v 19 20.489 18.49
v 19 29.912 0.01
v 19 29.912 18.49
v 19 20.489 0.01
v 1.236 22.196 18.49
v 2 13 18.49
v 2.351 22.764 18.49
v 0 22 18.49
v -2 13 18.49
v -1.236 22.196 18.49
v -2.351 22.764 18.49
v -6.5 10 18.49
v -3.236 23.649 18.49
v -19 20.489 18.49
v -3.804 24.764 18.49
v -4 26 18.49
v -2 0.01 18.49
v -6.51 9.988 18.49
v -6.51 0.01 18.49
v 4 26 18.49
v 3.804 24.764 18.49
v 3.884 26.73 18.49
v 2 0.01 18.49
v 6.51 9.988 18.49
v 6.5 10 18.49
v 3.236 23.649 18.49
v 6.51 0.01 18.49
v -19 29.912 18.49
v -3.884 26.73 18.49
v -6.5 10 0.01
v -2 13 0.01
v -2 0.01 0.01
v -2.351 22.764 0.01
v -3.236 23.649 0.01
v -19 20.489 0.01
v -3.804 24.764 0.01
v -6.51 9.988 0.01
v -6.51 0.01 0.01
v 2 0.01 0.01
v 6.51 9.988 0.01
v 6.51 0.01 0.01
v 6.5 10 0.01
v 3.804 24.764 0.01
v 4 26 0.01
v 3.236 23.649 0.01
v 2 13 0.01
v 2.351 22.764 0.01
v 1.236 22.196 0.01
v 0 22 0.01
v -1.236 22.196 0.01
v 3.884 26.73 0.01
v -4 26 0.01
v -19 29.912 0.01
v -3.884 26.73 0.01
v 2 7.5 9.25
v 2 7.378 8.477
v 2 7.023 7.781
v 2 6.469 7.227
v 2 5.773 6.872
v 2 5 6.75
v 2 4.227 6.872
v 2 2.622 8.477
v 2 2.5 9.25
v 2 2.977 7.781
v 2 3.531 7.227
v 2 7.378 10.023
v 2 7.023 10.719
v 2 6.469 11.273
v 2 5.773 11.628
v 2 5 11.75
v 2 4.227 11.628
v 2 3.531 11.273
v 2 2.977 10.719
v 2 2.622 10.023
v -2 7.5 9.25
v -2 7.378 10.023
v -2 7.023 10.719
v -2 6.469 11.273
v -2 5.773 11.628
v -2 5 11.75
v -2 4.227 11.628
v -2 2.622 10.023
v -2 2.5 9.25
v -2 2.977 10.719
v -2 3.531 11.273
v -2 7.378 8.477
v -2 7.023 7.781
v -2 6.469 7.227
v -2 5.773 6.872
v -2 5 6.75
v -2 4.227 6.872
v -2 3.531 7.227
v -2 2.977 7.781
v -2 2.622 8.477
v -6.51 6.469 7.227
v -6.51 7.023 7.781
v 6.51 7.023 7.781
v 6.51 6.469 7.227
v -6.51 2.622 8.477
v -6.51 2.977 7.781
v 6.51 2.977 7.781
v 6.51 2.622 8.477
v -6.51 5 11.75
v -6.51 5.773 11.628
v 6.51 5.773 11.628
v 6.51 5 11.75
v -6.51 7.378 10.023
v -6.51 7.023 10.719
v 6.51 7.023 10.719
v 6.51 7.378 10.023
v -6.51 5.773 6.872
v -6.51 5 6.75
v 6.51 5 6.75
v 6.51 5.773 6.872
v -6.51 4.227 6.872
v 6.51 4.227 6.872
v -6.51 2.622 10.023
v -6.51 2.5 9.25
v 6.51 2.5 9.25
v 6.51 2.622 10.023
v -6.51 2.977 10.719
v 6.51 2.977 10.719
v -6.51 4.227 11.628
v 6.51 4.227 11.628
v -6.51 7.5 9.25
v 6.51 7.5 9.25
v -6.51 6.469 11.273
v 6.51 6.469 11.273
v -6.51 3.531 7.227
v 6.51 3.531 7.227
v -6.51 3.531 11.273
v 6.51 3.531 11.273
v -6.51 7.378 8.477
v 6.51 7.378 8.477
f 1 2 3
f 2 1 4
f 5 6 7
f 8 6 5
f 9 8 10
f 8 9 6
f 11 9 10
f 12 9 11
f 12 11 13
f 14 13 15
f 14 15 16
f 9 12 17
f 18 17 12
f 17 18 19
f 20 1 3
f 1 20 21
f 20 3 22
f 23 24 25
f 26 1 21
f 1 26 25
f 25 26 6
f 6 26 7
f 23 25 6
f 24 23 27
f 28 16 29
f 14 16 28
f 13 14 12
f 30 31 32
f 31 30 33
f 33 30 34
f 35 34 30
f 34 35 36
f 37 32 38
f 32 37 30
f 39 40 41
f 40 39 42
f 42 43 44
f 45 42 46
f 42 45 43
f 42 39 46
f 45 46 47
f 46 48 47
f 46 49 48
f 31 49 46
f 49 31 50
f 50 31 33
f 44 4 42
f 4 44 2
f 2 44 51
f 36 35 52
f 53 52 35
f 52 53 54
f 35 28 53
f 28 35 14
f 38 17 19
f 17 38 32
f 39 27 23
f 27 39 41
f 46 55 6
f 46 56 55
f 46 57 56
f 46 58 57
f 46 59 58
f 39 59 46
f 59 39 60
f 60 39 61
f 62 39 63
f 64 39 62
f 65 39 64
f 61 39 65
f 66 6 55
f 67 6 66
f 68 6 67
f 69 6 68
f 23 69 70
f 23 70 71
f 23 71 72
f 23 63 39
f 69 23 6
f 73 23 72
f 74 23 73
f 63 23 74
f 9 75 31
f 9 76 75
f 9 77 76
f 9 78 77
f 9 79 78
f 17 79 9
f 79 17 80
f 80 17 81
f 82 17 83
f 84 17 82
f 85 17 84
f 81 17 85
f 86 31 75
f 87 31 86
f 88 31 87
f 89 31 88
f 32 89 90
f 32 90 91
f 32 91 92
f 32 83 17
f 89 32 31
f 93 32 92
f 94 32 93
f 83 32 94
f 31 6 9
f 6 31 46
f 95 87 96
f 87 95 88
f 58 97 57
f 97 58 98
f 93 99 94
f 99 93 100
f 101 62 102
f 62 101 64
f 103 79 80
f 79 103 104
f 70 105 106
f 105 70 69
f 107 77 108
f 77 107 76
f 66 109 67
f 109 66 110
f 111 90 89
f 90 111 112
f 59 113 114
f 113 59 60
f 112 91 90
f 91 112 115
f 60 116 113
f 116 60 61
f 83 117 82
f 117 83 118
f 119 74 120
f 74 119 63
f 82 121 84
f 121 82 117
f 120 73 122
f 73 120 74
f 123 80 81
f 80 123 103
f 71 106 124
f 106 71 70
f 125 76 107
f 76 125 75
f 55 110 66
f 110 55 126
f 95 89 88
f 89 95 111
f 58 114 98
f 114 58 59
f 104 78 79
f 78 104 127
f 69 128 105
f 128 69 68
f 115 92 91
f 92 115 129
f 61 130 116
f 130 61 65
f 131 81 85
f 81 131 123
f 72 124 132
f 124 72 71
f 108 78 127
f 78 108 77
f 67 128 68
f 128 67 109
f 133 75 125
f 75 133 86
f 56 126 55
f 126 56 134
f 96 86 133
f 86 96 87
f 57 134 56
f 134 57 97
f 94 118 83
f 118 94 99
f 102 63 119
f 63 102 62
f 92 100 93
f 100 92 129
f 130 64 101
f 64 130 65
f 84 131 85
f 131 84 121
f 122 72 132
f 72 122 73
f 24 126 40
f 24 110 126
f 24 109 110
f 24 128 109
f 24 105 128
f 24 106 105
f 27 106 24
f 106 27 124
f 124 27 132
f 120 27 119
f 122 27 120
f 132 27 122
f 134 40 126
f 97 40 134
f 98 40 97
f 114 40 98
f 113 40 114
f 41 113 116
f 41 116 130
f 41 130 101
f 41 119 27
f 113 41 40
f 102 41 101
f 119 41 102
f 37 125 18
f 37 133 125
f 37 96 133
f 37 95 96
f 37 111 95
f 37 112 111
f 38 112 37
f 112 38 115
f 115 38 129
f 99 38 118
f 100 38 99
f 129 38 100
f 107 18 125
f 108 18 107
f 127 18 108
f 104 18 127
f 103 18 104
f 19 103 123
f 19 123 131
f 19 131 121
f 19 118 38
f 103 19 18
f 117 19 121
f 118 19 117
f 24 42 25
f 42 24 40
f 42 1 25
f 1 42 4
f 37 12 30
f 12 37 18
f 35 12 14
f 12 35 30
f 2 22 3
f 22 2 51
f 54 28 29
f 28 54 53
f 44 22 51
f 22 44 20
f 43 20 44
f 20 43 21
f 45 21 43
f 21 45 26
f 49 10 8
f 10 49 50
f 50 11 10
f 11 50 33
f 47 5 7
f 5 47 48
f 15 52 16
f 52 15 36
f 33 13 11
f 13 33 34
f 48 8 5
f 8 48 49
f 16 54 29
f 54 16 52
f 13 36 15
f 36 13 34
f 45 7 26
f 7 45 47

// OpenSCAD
// include <../libs/pw_primitives.scad>;

length = 30; // total length in Y
width = 38; // total width in X
height = 18.5; // height in Z
back_width = 13; // width in X across back face
fulcrum_hole_diam = 5;
fulcrum_hole_forward = 5;
hbackw = back_width/2;
arm_cutout_width = 4;
arm_cutout_length = 13; // centre
back_length = 10; // length in Y from back face to start of outer angle
back_side_angle = 40; // angle of back outer sides
front_notch_diameter = 8; // diameter of circle for front notch
// for right triangle ABC with B=90deg, where we know length AB and angle A,
// C=90-A, BC = AB*sin(A)/sin(C), CA=AB*sin(B)/sin(C).
diag_back_length = ((width-back_width)/2)*sin(back_side_angle)/sin(90-back_side_angle);
diag_back_width = ((width-back_width)/2)/sin(90-back_side_angle);
// for right triangle ABC with B=90deg, where we know lengths AB and BC,
// A=atan(BC/AB)
front_notch_r = front_notch_diameter/2;
front_angle_forward = length-front_notch_r;
front_side_angle = atan(front_notch_r/(width/2));
fac_wid = (width/2)/sin(90-front_side_angle);

module front_corner_rotated_cube(x, y, z, angle) {
    translate([0, y, 0]) rotate([0, 0, angle]) translate([0, -y, 0])
        cube([x, y, z]);
};

$fn = 20;
difference() {
    // the whole area - slightly high and smaller to make every other
    // subtraction not face-overlap
    translate([-width/2, 0.01, 0.01]) cube([width, length-0.02, height-0.02]);
    // the central cutout for the arm
    translate([-arm_cutout_width/2, 0, 0])
        cube([arm_cutout_width, arm_cutout_length, height]);
    // the fulcrum hole
    translate([-back_width/2-0.02, back_length/2, height/2]) rotate([0, 90, 0]) 
        cylinder(h=back_width+0.04, d=fulcrum_hole_diam);
    // the back flat faces
    mirror([0, 0, 0]) translate([back_width/2+0.01, 0, 0]) 
        cube([(width-back_width)/2, back_length, height]);
    mirror([1, 0, 0]) translate([back_width/2+0.01, 0, 0]) 
        cube([(width-back_width)/2, back_length, height]);
    // the back angled faces
    mirror([0, 0, 0]) translate([back_width/2, back_length-diag_back_length, 0]) 
        front_corner_rotated_cube(
            diag_back_width, diag_back_length, height, back_side_angle
        );
    mirror([1, 0, 0]) translate([back_width/2, back_length-diag_back_length, 0]) 
        front_corner_rotated_cube(
            diag_back_width, diag_back_length, height, back_side_angle
        );
    // the front angled faces
    mirror([0, 0, 0]) translate([0, front_angle_forward, 0])
        front_corner_rotated_cube(fac_wid, front_notch_r, height, front_side_angle);
    mirror([1, 0, 0]) translate([0, front_angle_forward, 0])
        front_corner_rotated_cube(fac_wid, front_notch_r, height, front_side_angle);
    // the front centre notch
    translate([0, length-(front_notch_diameter/2), 0])
        cylinder(h=height, d=front_notch_diameter);
};
